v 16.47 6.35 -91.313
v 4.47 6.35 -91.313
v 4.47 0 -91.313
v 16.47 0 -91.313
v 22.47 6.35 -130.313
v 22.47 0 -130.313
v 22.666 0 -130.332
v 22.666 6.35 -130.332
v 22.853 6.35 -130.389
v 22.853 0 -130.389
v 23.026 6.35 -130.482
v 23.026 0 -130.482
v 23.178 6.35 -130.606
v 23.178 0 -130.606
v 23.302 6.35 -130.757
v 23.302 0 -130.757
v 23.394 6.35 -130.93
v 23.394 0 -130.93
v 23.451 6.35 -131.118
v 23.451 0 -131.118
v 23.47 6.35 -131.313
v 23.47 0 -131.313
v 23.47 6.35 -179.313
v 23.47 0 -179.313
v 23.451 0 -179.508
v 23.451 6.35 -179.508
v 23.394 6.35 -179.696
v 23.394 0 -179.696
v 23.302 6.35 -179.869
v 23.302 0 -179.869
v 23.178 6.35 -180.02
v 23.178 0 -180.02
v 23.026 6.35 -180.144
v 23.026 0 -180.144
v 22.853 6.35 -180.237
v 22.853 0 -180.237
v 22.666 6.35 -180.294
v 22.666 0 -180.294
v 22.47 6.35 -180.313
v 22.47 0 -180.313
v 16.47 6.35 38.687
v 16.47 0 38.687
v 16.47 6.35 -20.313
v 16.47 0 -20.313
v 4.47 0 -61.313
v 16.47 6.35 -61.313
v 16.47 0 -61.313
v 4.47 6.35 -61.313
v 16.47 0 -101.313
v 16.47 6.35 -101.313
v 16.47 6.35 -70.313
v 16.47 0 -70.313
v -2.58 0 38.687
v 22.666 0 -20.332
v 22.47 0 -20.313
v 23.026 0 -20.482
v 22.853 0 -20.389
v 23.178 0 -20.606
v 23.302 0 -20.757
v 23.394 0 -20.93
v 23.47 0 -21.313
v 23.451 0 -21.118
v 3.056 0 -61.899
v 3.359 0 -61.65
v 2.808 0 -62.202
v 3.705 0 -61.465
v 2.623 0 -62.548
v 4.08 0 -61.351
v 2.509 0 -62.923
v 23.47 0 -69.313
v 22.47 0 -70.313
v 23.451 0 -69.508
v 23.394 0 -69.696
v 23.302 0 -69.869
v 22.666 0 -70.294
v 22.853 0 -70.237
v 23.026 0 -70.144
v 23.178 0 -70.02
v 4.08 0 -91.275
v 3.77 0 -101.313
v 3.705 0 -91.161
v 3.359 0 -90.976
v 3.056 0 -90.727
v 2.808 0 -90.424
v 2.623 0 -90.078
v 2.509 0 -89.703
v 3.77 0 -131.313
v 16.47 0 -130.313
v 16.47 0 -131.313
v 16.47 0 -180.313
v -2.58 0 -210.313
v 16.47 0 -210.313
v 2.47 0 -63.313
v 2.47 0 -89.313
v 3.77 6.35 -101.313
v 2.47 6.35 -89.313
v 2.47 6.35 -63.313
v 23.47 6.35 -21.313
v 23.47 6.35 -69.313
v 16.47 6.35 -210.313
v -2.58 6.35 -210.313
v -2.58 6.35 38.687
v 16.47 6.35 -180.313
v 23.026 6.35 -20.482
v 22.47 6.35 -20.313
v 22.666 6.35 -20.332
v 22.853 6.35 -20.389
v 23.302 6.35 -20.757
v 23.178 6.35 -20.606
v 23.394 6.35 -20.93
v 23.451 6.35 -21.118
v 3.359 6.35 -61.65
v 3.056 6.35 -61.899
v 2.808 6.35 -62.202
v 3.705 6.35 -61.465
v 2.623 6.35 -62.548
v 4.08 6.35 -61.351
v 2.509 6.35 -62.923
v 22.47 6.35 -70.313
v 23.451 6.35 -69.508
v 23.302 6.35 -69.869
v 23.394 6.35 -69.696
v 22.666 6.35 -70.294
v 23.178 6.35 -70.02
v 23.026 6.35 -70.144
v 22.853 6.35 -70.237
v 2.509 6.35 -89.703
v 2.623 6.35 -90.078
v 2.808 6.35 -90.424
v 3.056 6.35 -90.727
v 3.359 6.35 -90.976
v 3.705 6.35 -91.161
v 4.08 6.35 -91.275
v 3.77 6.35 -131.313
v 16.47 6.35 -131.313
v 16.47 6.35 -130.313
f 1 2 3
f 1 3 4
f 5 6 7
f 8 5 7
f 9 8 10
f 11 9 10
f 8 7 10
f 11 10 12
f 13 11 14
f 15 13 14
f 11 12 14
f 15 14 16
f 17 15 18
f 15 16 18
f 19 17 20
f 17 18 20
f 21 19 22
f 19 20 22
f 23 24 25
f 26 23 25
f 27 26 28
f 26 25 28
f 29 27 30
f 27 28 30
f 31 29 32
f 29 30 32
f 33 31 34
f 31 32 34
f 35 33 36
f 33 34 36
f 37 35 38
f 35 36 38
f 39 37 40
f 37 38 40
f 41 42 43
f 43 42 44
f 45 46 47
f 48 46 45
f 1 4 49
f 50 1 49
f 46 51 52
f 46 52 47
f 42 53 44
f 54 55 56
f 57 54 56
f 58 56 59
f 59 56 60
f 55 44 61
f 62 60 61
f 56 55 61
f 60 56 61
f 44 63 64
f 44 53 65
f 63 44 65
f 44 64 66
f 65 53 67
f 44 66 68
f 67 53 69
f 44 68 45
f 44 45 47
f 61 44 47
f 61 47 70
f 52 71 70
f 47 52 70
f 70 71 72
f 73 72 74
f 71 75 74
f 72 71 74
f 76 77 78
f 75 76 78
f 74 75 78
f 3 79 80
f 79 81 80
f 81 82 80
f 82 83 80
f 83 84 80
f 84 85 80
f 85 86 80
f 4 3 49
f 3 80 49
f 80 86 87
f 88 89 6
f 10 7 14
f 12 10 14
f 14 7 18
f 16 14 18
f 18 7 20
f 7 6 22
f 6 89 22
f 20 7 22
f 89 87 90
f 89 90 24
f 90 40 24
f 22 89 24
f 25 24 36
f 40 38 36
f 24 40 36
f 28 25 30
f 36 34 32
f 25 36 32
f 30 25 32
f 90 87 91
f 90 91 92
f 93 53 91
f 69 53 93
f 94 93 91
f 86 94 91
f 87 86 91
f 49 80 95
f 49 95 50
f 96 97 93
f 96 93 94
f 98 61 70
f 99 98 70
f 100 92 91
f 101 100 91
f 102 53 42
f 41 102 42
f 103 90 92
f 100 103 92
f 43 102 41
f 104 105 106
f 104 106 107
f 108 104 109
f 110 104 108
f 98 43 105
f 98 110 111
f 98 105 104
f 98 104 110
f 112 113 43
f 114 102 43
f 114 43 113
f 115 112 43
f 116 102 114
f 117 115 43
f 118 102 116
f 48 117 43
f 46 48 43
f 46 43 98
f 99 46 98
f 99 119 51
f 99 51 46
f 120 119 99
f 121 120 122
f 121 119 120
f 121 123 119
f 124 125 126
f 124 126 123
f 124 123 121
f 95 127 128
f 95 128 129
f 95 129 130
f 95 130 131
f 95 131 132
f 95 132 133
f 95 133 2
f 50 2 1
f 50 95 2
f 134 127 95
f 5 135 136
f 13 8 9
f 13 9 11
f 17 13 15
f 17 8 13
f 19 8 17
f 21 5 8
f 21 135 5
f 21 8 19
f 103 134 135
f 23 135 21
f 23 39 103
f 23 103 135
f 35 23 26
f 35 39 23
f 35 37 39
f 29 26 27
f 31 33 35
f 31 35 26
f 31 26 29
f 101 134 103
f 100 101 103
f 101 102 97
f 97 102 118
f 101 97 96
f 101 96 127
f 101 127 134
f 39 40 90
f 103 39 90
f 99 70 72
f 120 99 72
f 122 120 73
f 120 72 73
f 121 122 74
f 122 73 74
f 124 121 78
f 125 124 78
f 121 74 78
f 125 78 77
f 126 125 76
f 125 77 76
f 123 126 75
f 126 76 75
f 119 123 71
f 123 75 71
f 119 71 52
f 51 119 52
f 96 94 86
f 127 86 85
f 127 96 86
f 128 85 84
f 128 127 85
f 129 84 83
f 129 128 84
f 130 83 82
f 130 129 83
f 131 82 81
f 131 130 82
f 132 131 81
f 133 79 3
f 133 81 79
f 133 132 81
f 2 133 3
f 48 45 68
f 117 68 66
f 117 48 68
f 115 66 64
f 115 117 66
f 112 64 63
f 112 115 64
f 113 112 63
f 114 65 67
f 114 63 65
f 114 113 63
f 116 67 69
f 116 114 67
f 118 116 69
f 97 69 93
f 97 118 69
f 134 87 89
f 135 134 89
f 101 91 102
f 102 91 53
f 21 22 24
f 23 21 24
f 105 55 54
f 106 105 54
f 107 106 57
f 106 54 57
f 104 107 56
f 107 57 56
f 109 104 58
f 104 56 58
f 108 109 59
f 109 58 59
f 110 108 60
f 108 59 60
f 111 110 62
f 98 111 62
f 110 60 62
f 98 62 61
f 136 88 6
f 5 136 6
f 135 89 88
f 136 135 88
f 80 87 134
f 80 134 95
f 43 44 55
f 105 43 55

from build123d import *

# Parameters (mm, degrees)
BOSS_EXTRUDE1_DEPTH = 6.35
CUT_EXTRUDE1_DEPTH  = 212.713804804
SKETCH5_W           = 12.7
SKETCH5_H           = 30
CUT_EXTRUDE3_DEPTH  = 212.713804804


with BuildPart() as part:
    # Sketch2 → Boss-Extrude1 (new body)
    with BuildSketch(Plane(origin=(0, 0, 0), x_dir=(1, 0, 0), z_dir=(0, 1, 0))):
        with BuildLine():
            Line((-2.579558011, -38.687016575), (16.470441989, -38.687016575))
            Line((16.470441989, -38.687016575), (16.470441989, 20.312983425))
            Line((16.470441989, 20.312983425), (22.470441989, 20.312983425))
            ThreePointArc((22.470441989, 20.312983425), (23.17754877, 20.605876644), (23.470441989, 21.312983425))
            Line((23.470441989, 21.312983425), (23.470441989, 69.312983425))
            ThreePointArc((23.470441989, 69.312983425), (23.17754877, 70.020090207), (22.470441989, 70.312983425))
            Line((22.470441989, 70.312983425), (16.470441989, 70.312983425))
            Line((16.470441989, 70.312983425), (16.470441989, 130.312983425))
            Line((16.470441989, 130.312983425), (22.470441989, 130.312983425))
            ThreePointArc((22.470441989, 130.312983425), (23.17754877, 130.605876644), (23.470441989, 131.312983425))
            Line((23.470441989, 131.312983425), (23.470441989, 179.312983425))
            ThreePointArc((23.470441989, 179.312983425), (23.17754877, 180.020090207), (22.470441989, 180.312983425))
            Line((22.470441989, 180.312983425), (16.470441989, 180.312983425))
            Line((16.470441989, 180.312983425), (16.470441989, 210.312983425))
            Line((16.470441989, 210.312983425), (-2.579558011, 210.312983425))
            Line((-2.579558011, 210.312983425), (-2.579558011, -38.687016575))
        make_face()
    extrude(amount=BOSS_EXTRUDE1_DEPTH)

    # Sketch3 → Cut-Extrude1 (cut, through all)
    with BuildSketch(Plane(origin=(0, 6.35, 0), x_dir=(1, 0, 0), z_dir=(0, 1, 0))):
        with BuildLine():
            Line((16.470441989, 61.312983425), (4.470441989, 61.312983425))
            ThreePointArc((4.470441989, 61.312983425), (3.056228427, 61.898769863), (2.470441989, 63.312983425))
            Line((2.470441989, 63.312983425), (2.470441989, 89.312983425))
            ThreePointArc((2.470441989, 89.312983425), (3.056228427, 90.727196988), (4.470441989, 91.312983425))
            Line((4.470441989, 91.312983425), (16.470441989, 91.312983425))
            Line((16.470441989, 91.312983425), (16.470441989, 61.312983425))
        make_face()
    extrude(amount=-CUT_EXTRUDE1_DEPTH, mode=Mode.SUBTRACT)

    # Sketch5 → Cut-Extrude3 (cut, through all)
    with BuildSketch(Plane.XZ):
        with Locations((10.120441989, -116.312983425)):
            Rectangle(SKETCH5_W, SKETCH5_H)
    extrude(amount=-CUT_EXTRUDE3_DEPTH, mode=Mode.SUBTRACT)


solid = part.part
